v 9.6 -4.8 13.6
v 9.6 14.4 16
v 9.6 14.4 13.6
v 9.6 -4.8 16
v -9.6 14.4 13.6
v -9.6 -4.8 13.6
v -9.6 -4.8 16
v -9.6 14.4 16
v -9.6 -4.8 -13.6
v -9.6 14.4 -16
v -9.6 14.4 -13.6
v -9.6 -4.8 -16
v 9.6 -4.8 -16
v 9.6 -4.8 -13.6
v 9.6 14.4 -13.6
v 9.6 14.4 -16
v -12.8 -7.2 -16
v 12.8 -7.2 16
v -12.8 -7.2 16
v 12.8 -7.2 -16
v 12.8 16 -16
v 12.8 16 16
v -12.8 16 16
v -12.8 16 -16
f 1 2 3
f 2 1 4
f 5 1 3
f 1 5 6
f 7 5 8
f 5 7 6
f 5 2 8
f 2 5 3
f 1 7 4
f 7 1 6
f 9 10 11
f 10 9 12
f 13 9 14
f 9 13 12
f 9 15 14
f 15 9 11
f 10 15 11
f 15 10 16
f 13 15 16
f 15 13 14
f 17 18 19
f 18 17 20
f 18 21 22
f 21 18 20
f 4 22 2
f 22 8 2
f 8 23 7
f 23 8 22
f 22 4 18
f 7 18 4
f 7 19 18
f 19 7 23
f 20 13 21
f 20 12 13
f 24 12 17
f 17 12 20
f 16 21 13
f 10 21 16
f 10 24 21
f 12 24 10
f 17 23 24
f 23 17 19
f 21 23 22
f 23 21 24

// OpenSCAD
size = 32;//block=32 //item=8



//cube([size*0.8,size*0.8,size*0.8],center=true);
difference() {
  cube([size * 0.8, size * 1, size * 1], center = true);

  union() {
    translate([0, -size * 0.375, 0]) {
      cube([size * 1 * 2, size * 0.3, size * 1 * 2], center = true);//front
    }
    ;//translate
    translate([0, size * 0.15, 0]) {
      for(i = [0:1:2]) {//top/bottom
        rotate([180 * i, 0, 0]) {
          translate([0, 0, size * 0.5]) {
            cube([size * 0.6, size * 0.6, size * 0.15], center = true);
          }
          ;//translate
        }
        ;//rotate
      }
      ;//for
    }
    ;//translate
  }
  ;

}
;
